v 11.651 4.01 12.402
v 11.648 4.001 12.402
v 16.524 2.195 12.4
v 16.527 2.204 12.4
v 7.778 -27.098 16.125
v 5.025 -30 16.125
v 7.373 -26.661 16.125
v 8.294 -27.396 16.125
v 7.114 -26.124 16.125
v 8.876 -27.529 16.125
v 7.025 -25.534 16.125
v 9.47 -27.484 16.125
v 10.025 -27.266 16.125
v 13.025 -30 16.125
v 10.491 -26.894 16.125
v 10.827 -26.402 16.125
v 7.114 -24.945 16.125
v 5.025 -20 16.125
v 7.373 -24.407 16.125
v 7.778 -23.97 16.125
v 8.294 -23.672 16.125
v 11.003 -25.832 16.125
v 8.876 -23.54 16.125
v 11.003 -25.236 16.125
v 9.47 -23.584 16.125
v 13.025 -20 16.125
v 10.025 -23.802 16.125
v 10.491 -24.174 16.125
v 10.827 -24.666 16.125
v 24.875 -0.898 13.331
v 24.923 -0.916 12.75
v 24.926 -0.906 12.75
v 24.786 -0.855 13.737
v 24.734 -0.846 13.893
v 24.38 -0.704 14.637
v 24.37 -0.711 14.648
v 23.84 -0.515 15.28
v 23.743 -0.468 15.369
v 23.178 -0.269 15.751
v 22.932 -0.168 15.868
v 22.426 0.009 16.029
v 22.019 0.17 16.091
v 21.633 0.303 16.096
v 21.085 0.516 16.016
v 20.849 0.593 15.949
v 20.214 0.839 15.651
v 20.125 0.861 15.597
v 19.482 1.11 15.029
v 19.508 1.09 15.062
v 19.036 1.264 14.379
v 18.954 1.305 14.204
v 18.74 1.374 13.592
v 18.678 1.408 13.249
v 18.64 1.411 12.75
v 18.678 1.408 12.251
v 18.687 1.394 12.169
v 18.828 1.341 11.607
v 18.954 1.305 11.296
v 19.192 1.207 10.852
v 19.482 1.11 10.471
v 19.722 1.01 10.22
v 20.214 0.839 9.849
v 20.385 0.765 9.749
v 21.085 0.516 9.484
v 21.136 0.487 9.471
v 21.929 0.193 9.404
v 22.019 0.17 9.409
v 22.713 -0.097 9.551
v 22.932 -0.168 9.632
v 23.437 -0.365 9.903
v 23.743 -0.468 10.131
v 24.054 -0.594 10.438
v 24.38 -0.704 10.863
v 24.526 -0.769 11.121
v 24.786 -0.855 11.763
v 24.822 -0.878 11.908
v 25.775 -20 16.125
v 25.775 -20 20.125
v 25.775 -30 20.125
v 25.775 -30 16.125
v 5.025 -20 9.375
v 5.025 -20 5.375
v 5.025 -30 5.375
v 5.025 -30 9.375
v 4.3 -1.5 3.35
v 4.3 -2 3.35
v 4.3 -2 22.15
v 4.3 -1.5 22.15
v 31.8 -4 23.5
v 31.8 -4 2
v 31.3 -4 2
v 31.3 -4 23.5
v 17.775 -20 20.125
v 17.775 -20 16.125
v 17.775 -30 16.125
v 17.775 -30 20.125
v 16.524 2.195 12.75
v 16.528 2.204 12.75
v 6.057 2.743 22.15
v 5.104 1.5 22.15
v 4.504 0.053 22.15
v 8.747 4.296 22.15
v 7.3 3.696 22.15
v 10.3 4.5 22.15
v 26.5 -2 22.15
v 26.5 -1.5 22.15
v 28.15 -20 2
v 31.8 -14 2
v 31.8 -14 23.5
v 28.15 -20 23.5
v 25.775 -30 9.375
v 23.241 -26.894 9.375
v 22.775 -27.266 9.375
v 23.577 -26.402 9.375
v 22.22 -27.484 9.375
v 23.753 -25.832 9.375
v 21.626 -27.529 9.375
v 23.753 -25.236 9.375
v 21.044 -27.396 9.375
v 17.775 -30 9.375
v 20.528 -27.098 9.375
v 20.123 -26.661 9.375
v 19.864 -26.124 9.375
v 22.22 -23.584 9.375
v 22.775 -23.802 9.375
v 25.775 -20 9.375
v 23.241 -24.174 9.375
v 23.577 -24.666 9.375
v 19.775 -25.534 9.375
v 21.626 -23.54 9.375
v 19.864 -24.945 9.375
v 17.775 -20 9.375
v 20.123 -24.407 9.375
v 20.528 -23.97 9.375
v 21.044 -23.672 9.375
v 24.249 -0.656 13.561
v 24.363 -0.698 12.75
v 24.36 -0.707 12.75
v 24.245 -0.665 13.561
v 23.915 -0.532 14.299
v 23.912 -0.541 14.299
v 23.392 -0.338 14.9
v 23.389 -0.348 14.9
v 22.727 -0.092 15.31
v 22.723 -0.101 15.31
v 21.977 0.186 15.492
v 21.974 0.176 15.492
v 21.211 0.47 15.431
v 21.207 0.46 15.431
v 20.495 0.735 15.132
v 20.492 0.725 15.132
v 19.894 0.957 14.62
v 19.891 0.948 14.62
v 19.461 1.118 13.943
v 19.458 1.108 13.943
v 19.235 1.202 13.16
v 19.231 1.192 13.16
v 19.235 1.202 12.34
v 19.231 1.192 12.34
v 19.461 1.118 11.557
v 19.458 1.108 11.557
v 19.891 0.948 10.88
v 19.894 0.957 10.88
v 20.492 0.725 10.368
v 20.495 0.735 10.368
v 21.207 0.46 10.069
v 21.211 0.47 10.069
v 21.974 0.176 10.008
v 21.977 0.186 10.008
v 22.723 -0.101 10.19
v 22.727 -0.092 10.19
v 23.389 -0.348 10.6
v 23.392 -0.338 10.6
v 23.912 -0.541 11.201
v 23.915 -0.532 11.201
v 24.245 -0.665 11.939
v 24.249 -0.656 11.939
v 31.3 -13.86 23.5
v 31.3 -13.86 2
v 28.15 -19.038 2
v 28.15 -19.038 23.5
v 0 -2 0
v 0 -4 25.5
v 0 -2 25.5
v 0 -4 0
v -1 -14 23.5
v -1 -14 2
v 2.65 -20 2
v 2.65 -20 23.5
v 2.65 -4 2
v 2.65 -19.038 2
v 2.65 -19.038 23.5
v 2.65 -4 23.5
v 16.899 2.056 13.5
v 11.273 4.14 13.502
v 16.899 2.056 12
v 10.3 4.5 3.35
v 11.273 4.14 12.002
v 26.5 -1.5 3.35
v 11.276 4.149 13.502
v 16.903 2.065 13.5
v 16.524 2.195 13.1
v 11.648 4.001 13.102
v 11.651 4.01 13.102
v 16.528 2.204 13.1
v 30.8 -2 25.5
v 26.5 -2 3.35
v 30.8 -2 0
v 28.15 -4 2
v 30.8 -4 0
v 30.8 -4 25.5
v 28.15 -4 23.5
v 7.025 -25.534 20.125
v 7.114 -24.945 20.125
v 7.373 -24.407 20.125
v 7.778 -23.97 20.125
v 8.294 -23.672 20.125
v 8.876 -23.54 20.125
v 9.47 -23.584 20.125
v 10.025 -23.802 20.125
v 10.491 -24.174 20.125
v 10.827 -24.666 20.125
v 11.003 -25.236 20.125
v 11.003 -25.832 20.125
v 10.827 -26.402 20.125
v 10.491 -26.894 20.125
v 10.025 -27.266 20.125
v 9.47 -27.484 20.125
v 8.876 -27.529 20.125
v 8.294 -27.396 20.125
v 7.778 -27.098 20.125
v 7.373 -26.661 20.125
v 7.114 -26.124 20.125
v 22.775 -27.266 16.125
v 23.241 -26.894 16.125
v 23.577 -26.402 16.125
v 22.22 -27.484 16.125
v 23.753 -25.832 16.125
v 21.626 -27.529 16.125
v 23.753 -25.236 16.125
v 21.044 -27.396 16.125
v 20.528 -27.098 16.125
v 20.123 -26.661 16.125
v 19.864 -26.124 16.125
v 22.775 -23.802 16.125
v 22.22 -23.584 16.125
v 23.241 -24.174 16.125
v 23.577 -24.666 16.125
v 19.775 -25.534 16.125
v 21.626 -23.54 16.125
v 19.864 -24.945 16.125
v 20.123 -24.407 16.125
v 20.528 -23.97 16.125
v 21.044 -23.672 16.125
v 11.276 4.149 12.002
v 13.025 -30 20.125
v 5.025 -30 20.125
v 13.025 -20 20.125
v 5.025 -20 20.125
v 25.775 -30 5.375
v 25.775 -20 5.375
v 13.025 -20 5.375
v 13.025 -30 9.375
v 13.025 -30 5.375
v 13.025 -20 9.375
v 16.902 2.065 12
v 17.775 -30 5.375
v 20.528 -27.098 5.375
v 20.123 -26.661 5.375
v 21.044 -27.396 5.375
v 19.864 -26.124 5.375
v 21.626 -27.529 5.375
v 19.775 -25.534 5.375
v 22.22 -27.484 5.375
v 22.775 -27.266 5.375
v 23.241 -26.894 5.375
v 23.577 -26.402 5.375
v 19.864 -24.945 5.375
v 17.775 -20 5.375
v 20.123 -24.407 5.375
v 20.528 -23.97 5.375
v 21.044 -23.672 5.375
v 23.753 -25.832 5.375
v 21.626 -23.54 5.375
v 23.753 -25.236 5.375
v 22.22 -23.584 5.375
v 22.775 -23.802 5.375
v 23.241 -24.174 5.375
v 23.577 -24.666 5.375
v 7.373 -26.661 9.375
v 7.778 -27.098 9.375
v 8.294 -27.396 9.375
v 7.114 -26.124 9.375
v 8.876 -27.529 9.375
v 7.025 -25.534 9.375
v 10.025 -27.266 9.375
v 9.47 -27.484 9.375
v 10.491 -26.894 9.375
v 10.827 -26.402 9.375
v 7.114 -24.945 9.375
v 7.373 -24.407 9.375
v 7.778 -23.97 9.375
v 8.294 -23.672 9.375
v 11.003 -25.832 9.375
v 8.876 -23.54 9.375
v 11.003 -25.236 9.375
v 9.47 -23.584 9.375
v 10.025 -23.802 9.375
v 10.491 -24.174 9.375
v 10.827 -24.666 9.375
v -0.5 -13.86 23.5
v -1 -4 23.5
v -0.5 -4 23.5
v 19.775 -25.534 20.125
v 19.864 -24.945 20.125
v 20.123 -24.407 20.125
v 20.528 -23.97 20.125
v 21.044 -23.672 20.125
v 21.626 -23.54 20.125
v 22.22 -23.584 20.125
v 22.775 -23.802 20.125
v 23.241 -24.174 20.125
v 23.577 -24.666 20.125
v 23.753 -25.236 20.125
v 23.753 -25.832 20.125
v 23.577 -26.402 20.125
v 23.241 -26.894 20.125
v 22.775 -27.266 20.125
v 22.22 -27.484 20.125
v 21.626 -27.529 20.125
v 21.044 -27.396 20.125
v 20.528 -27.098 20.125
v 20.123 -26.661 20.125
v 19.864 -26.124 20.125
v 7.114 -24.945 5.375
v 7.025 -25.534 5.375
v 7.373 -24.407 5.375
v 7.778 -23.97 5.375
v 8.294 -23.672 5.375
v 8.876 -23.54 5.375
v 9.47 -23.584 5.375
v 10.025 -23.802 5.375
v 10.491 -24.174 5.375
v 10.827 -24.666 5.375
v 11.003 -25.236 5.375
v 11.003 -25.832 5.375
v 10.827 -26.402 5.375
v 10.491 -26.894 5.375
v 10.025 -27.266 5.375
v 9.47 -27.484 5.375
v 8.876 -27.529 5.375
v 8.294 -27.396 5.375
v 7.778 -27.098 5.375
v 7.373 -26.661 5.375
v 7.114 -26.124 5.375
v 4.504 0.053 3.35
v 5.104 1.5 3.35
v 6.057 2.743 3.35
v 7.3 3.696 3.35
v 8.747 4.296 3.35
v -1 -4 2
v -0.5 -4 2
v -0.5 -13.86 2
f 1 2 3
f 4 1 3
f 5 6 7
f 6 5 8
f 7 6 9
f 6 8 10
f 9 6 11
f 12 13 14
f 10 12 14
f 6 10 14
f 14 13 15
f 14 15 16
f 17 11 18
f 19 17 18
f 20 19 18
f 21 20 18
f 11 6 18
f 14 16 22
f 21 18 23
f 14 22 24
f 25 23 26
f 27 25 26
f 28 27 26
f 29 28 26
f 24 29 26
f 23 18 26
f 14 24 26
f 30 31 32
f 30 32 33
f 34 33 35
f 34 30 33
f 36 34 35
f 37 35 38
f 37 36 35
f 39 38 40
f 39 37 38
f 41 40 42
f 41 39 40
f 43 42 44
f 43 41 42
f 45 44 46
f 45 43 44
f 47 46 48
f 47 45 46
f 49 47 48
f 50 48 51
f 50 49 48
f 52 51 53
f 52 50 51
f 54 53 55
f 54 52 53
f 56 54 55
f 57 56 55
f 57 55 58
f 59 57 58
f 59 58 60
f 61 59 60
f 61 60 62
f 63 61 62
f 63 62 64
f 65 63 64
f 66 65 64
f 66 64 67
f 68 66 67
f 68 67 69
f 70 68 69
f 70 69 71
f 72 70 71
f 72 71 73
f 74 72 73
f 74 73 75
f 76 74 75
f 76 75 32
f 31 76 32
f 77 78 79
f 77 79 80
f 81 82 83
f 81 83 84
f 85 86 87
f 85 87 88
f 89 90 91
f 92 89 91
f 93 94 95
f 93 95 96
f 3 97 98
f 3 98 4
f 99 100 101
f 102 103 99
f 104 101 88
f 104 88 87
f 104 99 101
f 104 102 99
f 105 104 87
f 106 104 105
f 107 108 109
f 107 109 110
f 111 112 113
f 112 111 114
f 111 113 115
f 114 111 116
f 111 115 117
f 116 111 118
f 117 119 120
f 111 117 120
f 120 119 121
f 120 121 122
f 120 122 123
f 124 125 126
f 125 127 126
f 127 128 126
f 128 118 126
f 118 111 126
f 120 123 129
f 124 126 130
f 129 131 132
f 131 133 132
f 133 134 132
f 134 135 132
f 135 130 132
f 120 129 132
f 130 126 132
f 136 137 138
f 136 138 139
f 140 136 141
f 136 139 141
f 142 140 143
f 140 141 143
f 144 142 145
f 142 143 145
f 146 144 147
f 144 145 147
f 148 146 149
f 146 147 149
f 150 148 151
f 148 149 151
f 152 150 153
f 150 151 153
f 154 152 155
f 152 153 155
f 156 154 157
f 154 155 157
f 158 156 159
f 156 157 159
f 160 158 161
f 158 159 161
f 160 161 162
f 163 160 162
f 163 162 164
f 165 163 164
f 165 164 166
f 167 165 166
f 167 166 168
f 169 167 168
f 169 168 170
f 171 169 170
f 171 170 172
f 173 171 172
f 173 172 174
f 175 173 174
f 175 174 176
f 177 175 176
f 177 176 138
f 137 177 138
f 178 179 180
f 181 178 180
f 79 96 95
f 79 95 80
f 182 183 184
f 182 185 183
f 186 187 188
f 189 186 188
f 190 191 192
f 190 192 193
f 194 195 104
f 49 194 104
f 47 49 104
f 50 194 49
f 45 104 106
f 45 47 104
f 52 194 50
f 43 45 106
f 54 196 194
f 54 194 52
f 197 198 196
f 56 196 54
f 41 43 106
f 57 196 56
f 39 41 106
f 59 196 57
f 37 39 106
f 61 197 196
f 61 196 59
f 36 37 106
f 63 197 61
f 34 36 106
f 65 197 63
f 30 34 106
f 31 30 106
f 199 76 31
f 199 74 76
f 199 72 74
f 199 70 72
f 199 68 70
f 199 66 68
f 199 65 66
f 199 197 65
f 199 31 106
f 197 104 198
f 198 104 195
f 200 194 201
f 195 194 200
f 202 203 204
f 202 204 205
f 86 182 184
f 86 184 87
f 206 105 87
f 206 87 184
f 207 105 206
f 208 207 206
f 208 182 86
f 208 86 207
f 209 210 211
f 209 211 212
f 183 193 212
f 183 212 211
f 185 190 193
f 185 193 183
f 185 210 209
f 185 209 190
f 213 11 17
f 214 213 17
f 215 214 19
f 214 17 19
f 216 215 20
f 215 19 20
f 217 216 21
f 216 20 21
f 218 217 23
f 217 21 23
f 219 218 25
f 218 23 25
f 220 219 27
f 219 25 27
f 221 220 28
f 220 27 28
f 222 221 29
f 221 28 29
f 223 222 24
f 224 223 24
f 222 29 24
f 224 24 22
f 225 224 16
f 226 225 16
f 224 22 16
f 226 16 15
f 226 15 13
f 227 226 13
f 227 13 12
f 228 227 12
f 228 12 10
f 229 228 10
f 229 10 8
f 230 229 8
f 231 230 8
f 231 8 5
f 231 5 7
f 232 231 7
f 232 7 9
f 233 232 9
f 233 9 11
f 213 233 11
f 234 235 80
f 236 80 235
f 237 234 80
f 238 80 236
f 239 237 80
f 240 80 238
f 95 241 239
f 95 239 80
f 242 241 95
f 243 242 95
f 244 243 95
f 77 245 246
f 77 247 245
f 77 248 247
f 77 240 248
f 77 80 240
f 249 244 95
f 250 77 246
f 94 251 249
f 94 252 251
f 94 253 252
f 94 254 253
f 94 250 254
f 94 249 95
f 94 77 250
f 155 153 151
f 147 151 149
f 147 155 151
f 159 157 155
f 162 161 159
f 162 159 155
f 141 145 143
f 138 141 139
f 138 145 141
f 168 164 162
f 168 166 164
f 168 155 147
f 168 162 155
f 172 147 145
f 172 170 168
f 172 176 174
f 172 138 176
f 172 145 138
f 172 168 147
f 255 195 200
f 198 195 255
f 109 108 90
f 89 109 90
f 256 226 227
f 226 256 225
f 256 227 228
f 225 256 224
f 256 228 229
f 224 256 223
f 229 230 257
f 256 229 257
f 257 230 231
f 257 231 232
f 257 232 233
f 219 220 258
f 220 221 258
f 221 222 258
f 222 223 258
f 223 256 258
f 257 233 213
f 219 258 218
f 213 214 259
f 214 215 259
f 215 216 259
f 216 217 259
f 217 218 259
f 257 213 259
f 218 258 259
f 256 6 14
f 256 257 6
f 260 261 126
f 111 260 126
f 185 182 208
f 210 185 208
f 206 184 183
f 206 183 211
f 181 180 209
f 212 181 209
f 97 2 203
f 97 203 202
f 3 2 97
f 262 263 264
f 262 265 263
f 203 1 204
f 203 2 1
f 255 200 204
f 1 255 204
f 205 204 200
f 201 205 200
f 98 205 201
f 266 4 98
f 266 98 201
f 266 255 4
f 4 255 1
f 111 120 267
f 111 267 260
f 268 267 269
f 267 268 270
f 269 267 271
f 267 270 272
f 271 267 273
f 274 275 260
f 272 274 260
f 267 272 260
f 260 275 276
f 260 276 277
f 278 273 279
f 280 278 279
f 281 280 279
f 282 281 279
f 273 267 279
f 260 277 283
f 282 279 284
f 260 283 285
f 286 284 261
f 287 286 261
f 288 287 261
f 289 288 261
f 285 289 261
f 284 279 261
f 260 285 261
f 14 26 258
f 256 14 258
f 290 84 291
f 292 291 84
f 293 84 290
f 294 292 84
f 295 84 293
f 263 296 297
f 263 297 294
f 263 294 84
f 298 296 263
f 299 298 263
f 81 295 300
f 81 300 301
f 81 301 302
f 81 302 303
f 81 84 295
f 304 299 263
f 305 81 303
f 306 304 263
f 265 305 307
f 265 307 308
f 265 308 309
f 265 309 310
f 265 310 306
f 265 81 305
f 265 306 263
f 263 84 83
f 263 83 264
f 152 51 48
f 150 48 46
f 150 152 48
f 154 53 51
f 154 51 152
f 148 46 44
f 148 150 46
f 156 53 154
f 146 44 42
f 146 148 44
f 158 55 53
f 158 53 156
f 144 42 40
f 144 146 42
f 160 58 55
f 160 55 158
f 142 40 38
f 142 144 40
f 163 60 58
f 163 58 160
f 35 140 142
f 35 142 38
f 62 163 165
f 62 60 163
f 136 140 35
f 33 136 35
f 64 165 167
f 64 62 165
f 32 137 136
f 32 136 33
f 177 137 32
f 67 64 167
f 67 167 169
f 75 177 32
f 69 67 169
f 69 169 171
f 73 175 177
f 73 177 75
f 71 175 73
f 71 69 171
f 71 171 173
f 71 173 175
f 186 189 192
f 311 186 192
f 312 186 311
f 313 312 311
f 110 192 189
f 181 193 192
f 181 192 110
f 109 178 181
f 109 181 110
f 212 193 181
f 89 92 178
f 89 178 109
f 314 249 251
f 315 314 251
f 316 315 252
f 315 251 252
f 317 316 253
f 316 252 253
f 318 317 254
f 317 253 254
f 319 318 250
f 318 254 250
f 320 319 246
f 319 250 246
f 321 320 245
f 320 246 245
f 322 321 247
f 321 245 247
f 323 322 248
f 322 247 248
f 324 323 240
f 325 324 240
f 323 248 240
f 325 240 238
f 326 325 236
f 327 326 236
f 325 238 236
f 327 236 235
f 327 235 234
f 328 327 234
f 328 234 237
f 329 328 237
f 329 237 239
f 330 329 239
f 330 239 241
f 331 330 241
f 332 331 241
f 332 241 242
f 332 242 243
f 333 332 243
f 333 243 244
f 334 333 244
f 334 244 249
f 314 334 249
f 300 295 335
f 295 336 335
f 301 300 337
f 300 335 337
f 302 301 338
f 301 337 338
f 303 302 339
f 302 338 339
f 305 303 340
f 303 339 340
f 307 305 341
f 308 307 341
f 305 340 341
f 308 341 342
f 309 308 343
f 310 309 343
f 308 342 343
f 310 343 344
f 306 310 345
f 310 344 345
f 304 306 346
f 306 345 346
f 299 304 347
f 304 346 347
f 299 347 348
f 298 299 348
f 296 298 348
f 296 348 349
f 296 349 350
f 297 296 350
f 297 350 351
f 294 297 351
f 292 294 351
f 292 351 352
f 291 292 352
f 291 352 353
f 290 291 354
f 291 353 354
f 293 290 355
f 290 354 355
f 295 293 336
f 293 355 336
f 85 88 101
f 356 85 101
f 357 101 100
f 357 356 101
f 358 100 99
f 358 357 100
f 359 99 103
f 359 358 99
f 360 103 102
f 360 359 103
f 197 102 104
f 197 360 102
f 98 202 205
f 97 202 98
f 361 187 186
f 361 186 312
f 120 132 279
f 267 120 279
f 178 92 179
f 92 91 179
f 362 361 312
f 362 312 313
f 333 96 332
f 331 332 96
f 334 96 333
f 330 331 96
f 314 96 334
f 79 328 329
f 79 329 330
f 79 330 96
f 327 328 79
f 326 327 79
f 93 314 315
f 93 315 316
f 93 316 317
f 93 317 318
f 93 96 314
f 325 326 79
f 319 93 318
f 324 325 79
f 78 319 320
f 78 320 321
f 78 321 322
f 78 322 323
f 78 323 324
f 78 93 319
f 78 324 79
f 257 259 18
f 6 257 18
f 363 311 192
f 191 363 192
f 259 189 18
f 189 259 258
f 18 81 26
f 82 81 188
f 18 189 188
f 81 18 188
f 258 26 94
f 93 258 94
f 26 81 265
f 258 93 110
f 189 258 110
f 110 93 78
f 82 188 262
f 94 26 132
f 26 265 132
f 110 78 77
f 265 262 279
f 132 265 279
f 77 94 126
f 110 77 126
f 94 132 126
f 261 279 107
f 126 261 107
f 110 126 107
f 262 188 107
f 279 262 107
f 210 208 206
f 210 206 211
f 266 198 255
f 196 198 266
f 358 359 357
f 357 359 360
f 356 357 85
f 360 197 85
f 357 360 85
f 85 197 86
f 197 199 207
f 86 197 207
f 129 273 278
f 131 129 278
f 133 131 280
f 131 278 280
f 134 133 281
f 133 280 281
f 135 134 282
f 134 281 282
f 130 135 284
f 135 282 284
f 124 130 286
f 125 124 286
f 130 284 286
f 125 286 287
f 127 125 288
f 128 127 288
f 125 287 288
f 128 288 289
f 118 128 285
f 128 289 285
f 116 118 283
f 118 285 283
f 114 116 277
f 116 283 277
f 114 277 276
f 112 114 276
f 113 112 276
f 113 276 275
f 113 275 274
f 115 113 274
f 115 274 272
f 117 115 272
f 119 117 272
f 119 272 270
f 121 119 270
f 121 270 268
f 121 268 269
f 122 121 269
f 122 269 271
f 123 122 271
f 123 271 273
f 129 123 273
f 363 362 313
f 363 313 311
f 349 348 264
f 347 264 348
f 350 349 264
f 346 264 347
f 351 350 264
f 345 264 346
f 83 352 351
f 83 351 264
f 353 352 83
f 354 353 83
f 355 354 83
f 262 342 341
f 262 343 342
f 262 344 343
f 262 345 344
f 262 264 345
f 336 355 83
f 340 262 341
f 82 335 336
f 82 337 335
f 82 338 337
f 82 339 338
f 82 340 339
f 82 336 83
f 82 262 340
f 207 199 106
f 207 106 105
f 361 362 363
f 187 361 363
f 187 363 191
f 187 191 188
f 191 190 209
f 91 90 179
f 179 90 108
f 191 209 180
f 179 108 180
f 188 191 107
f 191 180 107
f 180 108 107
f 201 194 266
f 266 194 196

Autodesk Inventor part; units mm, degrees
ref_plane "YZ Plane" through (0, 0, 0) normal (1, 0, 0) x (0, 1, 0)
ref_plane "XZ Plane" through (0, 0, 0) normal (0, 1, 0) x (-1, 0, 0)
ref_plane "XY Plane" through (0, 0, 0) normal (0, 0, 1) x (1, 0, 0)
sketch "Sketch1" plane through (0, 0, 0) normal (0, 0, 1) x (1, 0, 0)
  line L0 (0, -2) -> (30.8, -2)
  line L1 (4.3, -2) -> (4.3, -1.5)
  line L2 (30.8, -2) -> (30.8, -4)
  line L3 (30.8, -4) -> (0, -4)
  line L4 (0, -4) -> (0, -2)
  line L5 (2.65, -20) -> (28.15, -20)
  line L6 (2.65, -20) -> (2.65, -4)
  line L7 (28.15, -20) -> (28.15, -4)
  arc A0 (10.3, 4.5) -> (4.3, -1.5) centre (10.3, -1.5) ccw
  line L8 (10.3, 4.5) -> (26.5, -1.5)
  line L9 (26.5, -1.5) -> (26.5, -2)
  line L10 (-1, -14) -> (2.65, -20)
  line L11 (-1, -14) -> (-1, -4)
  line L12 (-0.5, -4) -> (-0.5, -13.8599)
  line L13 (-0.5, -13.8599) -> (2.65, -19.0379)
  line L14 (-1, -4) -> (-0.5, -4)
  line L15 (31.8, -14) -> (28.15, -20)
  line L16 (31.8, -14) -> (31.8, -4)
  line L17 (31.3, -4) -> (31.3, -13.8599)
  line L18 (31.3, -13.8599) -> (28.15, -19.0379)
  line L19 (31.8, -4) -> (31.3, -4)
  point P0 (4.3, 4.5)
  dimension "d0" = 30.8
  dimension "d2" = 6.5
  dimension "d4" = 2
  dimension "d6" = 4.3
  dimension "d9" = 25.5
  dimension "d10" = 16
  dimension "d11" = 6
  dimension "d12" = 0.5
  dimension "d13" = 6
  dimension "d16" = 6
  dimension "d17" = 10
  dimension "d19" = 0.5
extrude "Extrusion1" add sketch "Sketch1" along normal blind 25.5 contours L0 L2 L3 L4
extrude "Extrusion2" add sketch "Sketch1" along normal blind 22.15 contours L1 A0 L8 L9 L0
sketch "Sketch2" plane through (30.8, -4, 0) normal (1, 0, 0) x (0, 0, -1)
  line L0 (-3.35, 8.5) -> (-3.35, 2)
  line L1 (0, 8.5) -> (-22.15, 8.5) projected
  line L2 (-3.35, 8.5) -> (0, 8.5)
  line L3 (0, 0) -> (-25.5, 0) projected
  line L4 (0, 2) -> (-22.15, 2) projected
  line L5 (-3.35, 2) -> (0, 2)
  line L6 (0, 2) -> (0, 8.5)
  point P0 (0, 4)
extrude "Extrusion3" cut sketch "Sketch2" against normal blind 30
extrude "Extrusion4" add sketch "Sketch1" along normal blind 23.5 contours L3 L7 L5 L6 | L6 L10 L11 L14 L12 L13 | L18 L17 L19 L16 L15 L7
sketch "Sketch3" plane through (31.8, -14, 0) normal (1, 0, 0) x (0, 0, -1)
  line L0 (0, 10) -> (-25.5, 10) projected
  line L1 (0, 10) -> (-2, 10)
  line L2 (-2, 10) -> (-2, -9.6179)
  line L3 (-2, -9.6179) -> (0, -9.6179)
  line L4 (0, -5.0379) -> (0, 10) projected
  line L5 (0, -9.6179) -> (0, 10)
  line L6 (0, 10) -> (0, -9.6179)
  point P0 (0, 14)
  dimension "d29" = 2
extrude "Extrusion5" cut sketch "Sketch3" against normal blind 40
sketch "Sketch4" plane through (2.65, -20, 23.5) normal (0, -1, 0) x (1, 0, 0)
  line L0 (25.5, -21.5) -> (25.5, 0) projected
  line L1 (25.5, -21.5) -> (0, 0)
  line L2 (12.75, -10.75) -> (12.75, -21.5)
  line L3 (0, -21.5) -> (25.5, -21.5) projected
  line L4 (12.75, -21.5) -> (25.5, -21.5)
  line L5 (19.125, -21.5) -> (19.125, 0)
  line L6 (0, 0) -> (25.5, 0) projected
  line L7 (19.125, -16.125) -> (15.125, -16.125)
  line L8 (15.125, -16.125) -> (15.125, -18.125)
  line L9 (15.125, -18.125) -> (23.125, -18.125)
  line L10 (23.125, -18.125) -> (23.125, -14.125)
  line L11 (23.125, -14.125) -> (15.125, -14.125)
  line L12 (15.125, -14.125) -> (15.125, -16.125)
  line L13 (12.75, -10.75) -> (9.9991, -10.75)
  line L14 (10.375, -16.125) -> (10.375, -18.125)
  line L15 (10.375, -18.125) -> (2.375, -18.125)
  line L16 (2.375, -18.125) -> (2.375, -14.125)
  line L17 (2.375, -14.125) -> (10.375, -14.125)
  line L18 (10.375, -14.125) -> (10.375, -16.125)
  line L19 (15.125, -5.375) -> (15.125, -3.375)
  line L20 (15.125, -3.375) -> (23.125, -3.375)
  line L21 (23.125, -3.375) -> (23.125, -7.375)
  line L22 (23.125, -7.375) -> (15.125, -7.375)
  line L23 (15.125, -7.375) -> (15.125, -5.375)
  line L24 (10.375, -5.375) -> (10.375, -3.375)
  line L25 (10.375, -3.375) -> (2.375, -3.375)
  line L26 (2.375, -3.375) -> (2.375, -7.375)
  line L27 (2.375, -7.375) -> (10.375, -7.375)
  line L28 (10.375, -7.375) -> (10.375, -5.375)
  line L29 (19.125, -14.125) -> (16.7529, -14.125)
  line L30 (19.125, -7.375) -> (15.125, -7.375)
  line L31 (15.125, -3.375) -> (15.125, -7.375)
  line L32 (19.125, -3.375) -> (15.125, -3.375)
  point P0 (-2.65, -23.5)
  dimension "d32" = 4
  dimension "d33" = 2
  dimension "d34" = 8
  dimension "d35" = 4
extrude "Extrusion6" add sketch "Sketch4" along normal blind 10 contours L9 L5 L1 | L1 L5 L11 L10 L9 | L7 L12 L11 L1 | L1 L11 L5 | L5 L9 L8 L7 | L20 L21 L22 L5 | L5 L22 L23 L19 L20 | L25 L24 L28 L27 L1 | L1 L27 L26 L25 | L14 L15 L16 L17 L18
sketch "Sketch5" plane through (25.775, -20, 5.375) normal (0, 0, -1) x (-1, 0, 0)
  circle A0 centre (4, -5.5341) radius 2
  line L0 (23.125, 0) -> (-2.375, 0) projected
  line L1 (10.375, 0) -> (10.375, -1.7461)
  circle A1 centre (16.75, -5.5341) radius 2
  dimension "d38" = 4
extrude "Extrusion7" cut sketch "Sketch5" against normal blind 40
sketch "Sketch6" plane through (10.3, 4.5, 22.15) normal (0.3473, 0.9377, 0) x (0.9377, -0.3473, 0)
  line L0 (17.2754, 18.8) -> (17.2754, 0) projected
  line L1 (17.2754, 9.4) -> (-10.0504, 9.4)
  line L2 (17.4491, 0) -> (-3.3689, 0) projected
  line L3 (7.0401, 0) -> (7.0357, 14.775)
  line L4 (7.0357, 12.775) -> (7.0357, 16.775) projected
  line L5 (7.0373, 9.4) -> (17.4491, 0)
  circle A0 centre (12.2432, 9.4) radius 2.75
  line L6 (7.0401, 0) -> (0, 9.4)
  line L7 (0, 18.8) -> (0, 0) projected
  line L8 (7.0373, 9.4) -> (7.0375, 8.65)
  line L9 (7.0375, 8.65) -> (1.0375, 8.6482)
  line L10 (1.0375, 8.6482) -> (1.0371, 10.1482)
  line L11 (1.0371, 10.1482) -> (7.0371, 10.15)
  line L12 (7.0373, 9.4) -> (7.0371, 10.15)
  line L13 (1.0371, 10.1482) -> (7.0371, 10.15)
  circle A1 centre (12.2432, 9.4) radius 3.35
  line L14 (1.4371, 10.1484) -> (1.4374, 9.0484)
  line L15 (1.4374, 9.0484) -> (6.6374, 9.0499)
  line L16 (6.6374, 9.0499) -> (6.6373, 9.3999)
  line L17 (1.0372, 9.7482) -> (7.0372, 9.75)
  line L18 (6.6373, 9.3999) -> (6.6371, 10.1499)
  point P0 (-8.0959, 22.15)
  point P1 (1.4372, 9.7484)
  point P2 (6.6372, 9.7499)
  dimension "d41" = 5.5
  dimension "d42" = 0.75
  dimension "d43" = 6
  dimension "d44" = 1.5
  dimension "d45" = 0.6
  dimension "d46" = 0.4
  dimension "d47" = 0.4
  dimension "d48" = 0.4
extrude "Extrusion8" add sketch "Sketch6" along normal blind 0.01 contours A1 L1 A0 | L1 A0 A1 | L3 L9 L10 L1 L14 L15 L16 | L1 L18 L17 L3 | L17 L18 L11 L3 | L1 L10 L17 L14 | L17 L14 L11 L18 | L17 L10 L11 L14
sketch "Sketch7" plane through (13.025, -20, 5.375) normal (0, 0, -1) x (-1, 0, 0)
  circle A0 centre (4, -5.5341) radius 2 projected
properties part number "Tecla On_Off - Máquina - DMI"
